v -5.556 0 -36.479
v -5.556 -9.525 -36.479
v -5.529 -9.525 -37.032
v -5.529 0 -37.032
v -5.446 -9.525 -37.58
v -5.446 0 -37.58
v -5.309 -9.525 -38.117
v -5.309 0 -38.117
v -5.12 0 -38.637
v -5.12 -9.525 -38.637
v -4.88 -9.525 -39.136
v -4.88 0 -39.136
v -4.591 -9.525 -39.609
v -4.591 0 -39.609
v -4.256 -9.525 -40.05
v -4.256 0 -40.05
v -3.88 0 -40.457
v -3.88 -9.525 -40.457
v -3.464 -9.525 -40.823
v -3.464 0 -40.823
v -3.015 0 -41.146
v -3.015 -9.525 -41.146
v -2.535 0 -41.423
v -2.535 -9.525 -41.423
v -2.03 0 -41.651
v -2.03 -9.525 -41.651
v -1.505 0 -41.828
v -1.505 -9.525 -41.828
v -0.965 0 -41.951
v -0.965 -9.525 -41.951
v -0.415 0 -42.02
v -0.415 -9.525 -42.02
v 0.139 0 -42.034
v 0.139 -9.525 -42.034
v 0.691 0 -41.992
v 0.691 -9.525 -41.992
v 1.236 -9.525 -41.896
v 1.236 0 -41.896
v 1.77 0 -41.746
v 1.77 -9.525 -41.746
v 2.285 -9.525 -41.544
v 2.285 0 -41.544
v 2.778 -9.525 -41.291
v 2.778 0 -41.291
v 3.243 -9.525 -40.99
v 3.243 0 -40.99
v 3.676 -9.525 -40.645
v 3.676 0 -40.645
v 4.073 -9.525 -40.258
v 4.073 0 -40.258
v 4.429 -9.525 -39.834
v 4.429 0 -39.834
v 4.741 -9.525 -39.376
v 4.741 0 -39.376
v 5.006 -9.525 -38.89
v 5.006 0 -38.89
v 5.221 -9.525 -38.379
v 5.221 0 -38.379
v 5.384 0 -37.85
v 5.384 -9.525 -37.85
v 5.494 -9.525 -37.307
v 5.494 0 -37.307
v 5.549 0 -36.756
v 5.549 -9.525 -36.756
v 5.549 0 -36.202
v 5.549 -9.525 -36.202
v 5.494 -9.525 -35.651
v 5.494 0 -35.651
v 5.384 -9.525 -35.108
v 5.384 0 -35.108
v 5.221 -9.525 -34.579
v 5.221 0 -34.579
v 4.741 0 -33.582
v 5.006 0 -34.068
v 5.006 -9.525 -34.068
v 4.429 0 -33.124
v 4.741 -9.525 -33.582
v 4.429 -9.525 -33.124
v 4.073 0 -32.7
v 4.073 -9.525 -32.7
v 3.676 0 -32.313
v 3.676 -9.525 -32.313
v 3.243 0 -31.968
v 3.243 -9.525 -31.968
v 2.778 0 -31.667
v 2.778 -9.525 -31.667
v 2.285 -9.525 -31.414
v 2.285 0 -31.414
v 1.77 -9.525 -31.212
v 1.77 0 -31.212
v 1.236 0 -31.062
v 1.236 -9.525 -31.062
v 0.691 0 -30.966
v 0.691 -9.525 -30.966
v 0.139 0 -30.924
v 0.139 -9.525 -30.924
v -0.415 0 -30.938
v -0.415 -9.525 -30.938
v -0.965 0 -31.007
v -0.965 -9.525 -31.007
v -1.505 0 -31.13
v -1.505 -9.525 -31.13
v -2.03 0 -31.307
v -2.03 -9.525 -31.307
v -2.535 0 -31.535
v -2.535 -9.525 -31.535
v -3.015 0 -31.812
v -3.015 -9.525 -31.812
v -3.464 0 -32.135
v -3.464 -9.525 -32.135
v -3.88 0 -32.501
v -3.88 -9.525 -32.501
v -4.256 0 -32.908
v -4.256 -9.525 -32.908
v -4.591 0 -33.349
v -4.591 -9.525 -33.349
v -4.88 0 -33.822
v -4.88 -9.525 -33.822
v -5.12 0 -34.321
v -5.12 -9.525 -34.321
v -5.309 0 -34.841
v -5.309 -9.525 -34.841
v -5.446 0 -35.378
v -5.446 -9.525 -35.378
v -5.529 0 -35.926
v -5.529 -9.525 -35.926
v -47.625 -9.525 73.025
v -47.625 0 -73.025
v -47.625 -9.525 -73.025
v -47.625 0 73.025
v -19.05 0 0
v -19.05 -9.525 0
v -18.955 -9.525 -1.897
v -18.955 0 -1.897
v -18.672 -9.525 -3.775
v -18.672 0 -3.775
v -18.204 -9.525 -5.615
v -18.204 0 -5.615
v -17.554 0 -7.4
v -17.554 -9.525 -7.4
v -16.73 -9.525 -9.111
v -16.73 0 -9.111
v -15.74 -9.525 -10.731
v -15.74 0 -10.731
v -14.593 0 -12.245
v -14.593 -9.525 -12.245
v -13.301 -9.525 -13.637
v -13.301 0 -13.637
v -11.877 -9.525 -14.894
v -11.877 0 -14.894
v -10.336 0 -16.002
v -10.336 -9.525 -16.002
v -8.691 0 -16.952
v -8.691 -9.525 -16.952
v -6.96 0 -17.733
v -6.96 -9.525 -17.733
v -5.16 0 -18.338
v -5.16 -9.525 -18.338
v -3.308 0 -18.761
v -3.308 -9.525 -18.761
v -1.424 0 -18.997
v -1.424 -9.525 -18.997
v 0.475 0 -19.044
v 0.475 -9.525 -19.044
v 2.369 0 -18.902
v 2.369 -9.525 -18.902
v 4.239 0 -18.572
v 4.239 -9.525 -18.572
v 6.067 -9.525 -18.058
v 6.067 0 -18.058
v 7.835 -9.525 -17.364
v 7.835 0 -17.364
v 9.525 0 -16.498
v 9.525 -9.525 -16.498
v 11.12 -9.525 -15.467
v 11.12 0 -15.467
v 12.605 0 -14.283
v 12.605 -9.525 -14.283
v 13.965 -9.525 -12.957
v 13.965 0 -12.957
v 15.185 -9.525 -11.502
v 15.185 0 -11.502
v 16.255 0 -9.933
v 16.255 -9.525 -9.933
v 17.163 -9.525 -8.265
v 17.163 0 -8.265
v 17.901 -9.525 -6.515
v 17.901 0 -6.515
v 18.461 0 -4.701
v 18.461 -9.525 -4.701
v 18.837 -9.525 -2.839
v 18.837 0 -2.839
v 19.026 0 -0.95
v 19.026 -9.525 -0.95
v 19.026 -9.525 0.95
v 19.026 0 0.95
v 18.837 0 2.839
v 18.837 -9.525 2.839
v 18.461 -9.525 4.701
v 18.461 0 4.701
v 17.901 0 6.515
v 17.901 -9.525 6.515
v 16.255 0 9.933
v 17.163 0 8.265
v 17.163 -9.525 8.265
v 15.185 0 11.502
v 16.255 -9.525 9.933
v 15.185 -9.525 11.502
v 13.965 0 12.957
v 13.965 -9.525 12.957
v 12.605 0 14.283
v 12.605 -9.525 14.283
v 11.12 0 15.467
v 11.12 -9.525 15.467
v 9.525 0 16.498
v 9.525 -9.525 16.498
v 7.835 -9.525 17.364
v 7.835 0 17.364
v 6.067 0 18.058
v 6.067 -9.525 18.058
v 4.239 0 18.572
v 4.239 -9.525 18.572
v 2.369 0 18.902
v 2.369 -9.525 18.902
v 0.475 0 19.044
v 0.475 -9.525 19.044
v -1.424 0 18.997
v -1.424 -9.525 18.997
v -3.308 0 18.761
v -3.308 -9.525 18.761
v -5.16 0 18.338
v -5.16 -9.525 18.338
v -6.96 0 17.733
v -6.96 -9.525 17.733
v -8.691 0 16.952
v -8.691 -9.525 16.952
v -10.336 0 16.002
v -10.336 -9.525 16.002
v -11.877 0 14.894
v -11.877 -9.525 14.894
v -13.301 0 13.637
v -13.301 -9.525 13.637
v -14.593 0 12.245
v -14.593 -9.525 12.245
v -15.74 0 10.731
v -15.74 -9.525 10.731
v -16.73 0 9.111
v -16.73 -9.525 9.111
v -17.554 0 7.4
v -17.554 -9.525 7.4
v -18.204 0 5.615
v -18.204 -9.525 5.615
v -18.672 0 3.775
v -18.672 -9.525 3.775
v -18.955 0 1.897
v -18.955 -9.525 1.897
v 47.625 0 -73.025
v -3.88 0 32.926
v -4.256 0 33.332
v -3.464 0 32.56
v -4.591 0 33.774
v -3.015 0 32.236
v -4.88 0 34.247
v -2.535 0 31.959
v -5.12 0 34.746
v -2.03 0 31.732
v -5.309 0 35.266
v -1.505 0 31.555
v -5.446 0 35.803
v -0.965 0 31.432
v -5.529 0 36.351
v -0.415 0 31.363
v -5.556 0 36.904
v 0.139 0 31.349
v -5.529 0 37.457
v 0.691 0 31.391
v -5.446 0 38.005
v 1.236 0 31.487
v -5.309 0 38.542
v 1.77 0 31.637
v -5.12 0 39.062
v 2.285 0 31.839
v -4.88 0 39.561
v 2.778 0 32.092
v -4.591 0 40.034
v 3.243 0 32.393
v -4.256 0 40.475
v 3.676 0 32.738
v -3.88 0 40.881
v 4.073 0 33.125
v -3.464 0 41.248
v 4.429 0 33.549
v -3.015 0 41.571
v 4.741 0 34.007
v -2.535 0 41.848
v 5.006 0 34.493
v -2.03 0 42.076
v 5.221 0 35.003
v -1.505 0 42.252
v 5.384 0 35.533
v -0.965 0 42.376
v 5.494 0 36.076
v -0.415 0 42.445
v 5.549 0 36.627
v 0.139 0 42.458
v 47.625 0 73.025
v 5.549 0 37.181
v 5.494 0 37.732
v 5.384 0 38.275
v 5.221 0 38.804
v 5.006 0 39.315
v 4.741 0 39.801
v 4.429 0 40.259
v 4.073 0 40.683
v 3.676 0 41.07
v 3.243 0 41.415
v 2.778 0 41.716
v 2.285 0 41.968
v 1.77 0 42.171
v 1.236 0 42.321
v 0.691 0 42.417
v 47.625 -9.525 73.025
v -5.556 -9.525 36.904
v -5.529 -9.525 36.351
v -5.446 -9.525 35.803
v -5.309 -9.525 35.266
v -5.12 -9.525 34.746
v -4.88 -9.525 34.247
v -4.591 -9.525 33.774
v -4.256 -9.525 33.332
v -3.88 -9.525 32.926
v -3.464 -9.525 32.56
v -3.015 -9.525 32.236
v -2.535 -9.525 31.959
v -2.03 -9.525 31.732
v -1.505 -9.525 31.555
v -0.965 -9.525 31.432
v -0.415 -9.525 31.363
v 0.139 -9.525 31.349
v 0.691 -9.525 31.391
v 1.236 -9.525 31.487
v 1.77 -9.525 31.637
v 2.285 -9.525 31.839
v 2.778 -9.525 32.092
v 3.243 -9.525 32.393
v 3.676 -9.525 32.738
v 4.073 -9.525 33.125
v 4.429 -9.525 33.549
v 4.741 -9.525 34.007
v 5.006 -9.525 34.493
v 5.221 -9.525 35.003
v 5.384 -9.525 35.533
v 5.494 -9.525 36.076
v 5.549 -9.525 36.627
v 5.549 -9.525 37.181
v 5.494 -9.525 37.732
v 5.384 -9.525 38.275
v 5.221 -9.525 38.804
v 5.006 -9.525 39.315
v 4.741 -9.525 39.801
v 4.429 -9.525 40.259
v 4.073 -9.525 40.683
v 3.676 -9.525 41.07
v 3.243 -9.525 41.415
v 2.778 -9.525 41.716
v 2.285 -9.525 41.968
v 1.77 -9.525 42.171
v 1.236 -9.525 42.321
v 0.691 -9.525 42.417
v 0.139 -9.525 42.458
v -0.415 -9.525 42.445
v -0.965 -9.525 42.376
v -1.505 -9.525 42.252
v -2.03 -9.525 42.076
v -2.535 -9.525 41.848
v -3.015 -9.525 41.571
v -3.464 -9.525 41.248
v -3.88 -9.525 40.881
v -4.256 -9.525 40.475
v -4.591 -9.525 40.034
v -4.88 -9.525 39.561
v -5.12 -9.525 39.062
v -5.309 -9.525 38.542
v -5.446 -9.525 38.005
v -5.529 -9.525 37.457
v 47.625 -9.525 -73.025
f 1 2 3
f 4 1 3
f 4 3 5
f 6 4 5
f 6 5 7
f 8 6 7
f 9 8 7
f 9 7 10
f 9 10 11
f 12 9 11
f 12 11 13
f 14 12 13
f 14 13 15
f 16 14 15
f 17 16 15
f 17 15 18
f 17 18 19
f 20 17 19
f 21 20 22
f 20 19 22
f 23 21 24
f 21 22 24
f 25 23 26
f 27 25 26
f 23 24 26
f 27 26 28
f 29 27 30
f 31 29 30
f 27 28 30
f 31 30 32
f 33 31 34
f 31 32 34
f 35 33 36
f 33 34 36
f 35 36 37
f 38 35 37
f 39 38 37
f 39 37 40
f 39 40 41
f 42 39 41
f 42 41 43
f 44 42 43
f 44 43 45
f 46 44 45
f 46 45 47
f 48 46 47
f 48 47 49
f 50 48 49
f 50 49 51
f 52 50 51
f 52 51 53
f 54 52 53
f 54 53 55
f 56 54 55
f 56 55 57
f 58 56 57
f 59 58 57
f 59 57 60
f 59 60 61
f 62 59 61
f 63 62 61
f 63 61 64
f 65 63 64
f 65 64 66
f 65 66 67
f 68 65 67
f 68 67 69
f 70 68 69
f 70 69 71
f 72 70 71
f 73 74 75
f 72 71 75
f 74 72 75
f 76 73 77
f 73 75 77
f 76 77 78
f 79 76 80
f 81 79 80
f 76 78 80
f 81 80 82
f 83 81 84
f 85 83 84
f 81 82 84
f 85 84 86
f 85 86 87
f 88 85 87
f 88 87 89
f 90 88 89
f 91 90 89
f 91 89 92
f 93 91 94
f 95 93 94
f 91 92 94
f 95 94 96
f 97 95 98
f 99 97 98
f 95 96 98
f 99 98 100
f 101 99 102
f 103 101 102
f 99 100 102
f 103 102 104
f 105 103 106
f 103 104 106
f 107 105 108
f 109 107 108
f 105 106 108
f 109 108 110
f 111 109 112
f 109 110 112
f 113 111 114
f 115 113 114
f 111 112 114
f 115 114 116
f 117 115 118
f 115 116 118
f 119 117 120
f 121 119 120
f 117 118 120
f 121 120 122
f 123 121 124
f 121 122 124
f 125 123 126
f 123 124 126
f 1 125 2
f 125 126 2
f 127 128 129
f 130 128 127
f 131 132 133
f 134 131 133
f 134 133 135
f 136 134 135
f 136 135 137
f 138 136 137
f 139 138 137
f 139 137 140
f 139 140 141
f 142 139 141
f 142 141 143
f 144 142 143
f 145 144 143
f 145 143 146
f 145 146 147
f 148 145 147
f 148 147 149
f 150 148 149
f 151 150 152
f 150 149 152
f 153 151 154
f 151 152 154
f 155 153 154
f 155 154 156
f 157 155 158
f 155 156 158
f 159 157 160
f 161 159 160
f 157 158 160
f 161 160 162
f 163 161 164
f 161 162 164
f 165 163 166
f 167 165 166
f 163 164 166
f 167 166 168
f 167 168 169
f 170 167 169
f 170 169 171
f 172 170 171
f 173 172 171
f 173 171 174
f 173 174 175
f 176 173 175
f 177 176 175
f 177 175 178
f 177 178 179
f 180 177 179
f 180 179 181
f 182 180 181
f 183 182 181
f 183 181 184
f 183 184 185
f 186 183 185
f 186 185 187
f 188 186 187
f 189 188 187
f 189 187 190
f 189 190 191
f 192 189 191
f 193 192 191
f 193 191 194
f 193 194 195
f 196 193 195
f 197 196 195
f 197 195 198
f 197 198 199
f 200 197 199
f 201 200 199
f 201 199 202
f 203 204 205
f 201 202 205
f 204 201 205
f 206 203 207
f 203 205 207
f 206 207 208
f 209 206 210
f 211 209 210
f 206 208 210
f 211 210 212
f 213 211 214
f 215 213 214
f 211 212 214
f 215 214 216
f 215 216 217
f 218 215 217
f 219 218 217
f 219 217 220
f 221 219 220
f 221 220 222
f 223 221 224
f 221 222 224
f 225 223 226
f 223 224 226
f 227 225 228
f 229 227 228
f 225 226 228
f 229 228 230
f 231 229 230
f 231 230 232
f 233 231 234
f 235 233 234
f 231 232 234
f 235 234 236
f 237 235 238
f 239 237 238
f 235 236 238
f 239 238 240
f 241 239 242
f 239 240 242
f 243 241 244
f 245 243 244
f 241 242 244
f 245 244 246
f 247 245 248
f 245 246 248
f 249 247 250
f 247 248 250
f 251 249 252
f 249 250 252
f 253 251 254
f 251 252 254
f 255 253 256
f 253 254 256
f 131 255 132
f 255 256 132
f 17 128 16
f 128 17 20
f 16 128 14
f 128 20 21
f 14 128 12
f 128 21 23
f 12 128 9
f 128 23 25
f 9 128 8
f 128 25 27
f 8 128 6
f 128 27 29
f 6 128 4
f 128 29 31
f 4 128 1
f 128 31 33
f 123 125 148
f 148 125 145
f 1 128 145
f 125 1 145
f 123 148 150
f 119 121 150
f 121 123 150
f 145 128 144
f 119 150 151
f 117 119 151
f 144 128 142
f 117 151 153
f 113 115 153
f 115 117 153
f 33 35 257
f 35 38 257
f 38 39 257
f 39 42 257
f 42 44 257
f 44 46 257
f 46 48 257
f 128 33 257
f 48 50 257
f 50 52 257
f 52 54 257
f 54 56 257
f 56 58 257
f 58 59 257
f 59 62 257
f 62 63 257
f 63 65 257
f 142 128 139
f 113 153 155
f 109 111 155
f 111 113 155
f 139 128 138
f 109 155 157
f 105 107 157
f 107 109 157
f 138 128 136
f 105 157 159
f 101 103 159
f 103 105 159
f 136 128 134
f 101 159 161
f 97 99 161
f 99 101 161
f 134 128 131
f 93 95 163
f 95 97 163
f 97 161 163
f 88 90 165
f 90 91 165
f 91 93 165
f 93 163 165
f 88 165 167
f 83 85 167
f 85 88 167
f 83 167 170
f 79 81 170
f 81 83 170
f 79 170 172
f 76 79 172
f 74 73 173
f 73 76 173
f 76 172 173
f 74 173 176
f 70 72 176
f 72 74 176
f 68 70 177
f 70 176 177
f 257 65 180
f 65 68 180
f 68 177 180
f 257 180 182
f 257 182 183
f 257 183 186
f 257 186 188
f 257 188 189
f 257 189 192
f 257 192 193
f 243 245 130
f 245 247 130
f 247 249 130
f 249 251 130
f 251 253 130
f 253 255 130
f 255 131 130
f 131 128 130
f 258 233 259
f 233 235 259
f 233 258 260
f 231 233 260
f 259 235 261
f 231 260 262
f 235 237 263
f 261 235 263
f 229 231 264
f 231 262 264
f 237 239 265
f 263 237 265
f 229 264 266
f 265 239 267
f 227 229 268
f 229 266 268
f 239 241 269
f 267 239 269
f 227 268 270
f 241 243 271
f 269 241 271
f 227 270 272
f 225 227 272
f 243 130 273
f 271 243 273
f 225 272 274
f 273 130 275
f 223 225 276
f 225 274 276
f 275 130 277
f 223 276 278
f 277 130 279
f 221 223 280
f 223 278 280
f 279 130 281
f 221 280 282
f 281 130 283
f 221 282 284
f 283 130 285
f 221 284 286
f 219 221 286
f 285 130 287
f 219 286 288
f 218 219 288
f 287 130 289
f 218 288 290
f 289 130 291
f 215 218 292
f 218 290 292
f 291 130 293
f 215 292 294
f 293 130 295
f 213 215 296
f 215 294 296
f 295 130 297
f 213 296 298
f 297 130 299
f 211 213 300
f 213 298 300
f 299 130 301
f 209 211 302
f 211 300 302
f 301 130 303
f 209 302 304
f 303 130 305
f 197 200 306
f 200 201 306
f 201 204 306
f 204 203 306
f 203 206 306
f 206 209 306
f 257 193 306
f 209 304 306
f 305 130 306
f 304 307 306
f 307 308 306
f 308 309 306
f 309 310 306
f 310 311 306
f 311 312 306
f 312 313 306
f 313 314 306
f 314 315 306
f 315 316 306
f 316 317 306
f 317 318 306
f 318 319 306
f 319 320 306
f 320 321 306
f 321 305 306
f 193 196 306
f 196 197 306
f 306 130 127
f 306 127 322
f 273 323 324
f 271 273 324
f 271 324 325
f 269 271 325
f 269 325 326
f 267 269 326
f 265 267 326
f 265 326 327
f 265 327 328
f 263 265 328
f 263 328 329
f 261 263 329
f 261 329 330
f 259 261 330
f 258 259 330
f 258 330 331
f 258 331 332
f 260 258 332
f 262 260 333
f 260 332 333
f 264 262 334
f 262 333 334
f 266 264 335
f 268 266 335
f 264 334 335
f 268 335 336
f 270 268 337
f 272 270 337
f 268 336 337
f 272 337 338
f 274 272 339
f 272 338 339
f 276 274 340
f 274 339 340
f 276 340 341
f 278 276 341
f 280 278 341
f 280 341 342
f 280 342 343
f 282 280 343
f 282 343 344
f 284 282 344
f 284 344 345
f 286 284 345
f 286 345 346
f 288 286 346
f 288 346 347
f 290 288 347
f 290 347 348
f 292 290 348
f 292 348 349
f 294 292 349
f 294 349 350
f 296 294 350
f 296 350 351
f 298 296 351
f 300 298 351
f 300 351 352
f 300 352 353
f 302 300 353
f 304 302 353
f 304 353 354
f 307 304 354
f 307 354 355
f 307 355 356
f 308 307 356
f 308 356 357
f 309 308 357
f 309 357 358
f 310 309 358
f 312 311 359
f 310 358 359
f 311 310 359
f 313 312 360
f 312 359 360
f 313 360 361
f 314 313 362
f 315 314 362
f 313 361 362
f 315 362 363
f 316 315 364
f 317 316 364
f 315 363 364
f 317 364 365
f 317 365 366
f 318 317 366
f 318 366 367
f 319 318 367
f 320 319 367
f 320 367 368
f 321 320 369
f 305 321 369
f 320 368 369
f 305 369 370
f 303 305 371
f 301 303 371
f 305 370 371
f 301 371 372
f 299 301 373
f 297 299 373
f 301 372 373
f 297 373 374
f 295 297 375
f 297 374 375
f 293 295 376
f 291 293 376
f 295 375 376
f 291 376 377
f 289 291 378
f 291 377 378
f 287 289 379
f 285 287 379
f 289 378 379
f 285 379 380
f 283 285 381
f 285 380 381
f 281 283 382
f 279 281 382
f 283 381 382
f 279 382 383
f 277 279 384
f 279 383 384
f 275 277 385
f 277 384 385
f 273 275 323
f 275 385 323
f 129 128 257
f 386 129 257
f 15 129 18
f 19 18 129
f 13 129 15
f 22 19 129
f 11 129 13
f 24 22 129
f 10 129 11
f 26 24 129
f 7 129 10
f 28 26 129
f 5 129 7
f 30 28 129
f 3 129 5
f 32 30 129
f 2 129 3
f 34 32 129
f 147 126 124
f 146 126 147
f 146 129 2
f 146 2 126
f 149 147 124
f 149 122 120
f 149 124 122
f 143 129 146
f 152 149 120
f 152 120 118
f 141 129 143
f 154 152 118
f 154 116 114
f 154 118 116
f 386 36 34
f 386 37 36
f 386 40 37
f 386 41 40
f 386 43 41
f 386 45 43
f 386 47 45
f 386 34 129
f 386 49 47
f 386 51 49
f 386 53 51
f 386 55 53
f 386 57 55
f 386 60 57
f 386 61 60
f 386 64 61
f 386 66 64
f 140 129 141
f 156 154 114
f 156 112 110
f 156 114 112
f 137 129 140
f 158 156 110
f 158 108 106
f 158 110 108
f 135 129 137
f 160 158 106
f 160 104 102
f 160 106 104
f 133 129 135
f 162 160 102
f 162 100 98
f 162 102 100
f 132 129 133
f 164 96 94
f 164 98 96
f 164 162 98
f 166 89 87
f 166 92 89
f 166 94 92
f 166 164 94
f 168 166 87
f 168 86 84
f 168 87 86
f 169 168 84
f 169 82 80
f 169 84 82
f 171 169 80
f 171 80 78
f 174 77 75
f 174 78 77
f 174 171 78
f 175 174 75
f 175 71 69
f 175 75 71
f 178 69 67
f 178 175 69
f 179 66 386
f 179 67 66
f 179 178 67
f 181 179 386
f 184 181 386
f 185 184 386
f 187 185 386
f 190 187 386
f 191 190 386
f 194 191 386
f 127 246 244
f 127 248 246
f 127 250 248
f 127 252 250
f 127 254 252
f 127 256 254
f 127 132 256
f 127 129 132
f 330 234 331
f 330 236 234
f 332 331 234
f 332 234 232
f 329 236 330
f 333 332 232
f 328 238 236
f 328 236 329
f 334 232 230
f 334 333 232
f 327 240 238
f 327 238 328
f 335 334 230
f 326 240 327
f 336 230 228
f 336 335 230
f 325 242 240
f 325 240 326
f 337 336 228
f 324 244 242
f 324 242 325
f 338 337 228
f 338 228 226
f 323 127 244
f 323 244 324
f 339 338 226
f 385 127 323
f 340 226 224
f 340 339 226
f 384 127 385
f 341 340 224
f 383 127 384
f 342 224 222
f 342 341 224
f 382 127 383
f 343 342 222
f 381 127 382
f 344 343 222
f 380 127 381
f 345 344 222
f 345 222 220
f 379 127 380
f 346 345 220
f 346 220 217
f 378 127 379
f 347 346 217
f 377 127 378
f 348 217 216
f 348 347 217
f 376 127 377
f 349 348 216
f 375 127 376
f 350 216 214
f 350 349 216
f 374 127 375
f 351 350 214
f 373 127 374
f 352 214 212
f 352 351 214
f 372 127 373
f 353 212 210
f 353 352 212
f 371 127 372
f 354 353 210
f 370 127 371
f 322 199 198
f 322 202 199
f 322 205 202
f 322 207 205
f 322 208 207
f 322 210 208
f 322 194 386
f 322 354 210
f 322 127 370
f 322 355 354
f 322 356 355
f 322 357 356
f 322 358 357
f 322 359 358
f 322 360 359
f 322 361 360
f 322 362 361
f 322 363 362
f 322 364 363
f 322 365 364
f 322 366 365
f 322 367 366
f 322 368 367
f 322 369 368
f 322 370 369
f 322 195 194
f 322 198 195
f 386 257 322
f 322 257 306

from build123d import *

# Parameters (mm, degrees)
F1_W     = 95.25
F1_H     = 146.05
F2_DEPTH = 9.525
F3_D     = 38.1
F3_DEPTH = 12.7
F3_TIP   = 11.4463947925
F4_D     = 11.1125
F5_D     = 11.1125


with BuildPart() as f2:
    # F1 (on Front) → F2 (new body)
    with BuildSketch(Plane.XZ):
        Rectangle(F1_W, F1_H)
    extrude(amount=F2_DEPTH)

    # F3
    with Locations(Plane(origin=(0, 0, 0), x_dir=(1, 0, 0), z_dir=(0, 1, 0))):
        with Locations((0, 0)):
            Hole(F3_D / 2, depth=F3_DEPTH)
            with Locations((0, 0, -(F3_DEPTH + F3_TIP / 2))):  # 118° drill point
                Cone(0, F3_D / 2, F3_TIP, mode=Mode.SUBTRACT)

    # F4 (through all)
    with Locations(Plane(origin=(0, 0, 0), x_dir=(1, 0, 0), z_dir=(0, 1, 0))):
        with Locations((0, -36.9038395584)):
            Hole(F4_D / 2)

    # F5 (through all)
    with Locations(Plane(origin=(0, 0, 0), x_dir=(1, 0, 0), z_dir=(0, 1, 0))):
        with Locations((0, 36.4790037274)):
            Hole(F5_D / 2)


solid = f2.part
